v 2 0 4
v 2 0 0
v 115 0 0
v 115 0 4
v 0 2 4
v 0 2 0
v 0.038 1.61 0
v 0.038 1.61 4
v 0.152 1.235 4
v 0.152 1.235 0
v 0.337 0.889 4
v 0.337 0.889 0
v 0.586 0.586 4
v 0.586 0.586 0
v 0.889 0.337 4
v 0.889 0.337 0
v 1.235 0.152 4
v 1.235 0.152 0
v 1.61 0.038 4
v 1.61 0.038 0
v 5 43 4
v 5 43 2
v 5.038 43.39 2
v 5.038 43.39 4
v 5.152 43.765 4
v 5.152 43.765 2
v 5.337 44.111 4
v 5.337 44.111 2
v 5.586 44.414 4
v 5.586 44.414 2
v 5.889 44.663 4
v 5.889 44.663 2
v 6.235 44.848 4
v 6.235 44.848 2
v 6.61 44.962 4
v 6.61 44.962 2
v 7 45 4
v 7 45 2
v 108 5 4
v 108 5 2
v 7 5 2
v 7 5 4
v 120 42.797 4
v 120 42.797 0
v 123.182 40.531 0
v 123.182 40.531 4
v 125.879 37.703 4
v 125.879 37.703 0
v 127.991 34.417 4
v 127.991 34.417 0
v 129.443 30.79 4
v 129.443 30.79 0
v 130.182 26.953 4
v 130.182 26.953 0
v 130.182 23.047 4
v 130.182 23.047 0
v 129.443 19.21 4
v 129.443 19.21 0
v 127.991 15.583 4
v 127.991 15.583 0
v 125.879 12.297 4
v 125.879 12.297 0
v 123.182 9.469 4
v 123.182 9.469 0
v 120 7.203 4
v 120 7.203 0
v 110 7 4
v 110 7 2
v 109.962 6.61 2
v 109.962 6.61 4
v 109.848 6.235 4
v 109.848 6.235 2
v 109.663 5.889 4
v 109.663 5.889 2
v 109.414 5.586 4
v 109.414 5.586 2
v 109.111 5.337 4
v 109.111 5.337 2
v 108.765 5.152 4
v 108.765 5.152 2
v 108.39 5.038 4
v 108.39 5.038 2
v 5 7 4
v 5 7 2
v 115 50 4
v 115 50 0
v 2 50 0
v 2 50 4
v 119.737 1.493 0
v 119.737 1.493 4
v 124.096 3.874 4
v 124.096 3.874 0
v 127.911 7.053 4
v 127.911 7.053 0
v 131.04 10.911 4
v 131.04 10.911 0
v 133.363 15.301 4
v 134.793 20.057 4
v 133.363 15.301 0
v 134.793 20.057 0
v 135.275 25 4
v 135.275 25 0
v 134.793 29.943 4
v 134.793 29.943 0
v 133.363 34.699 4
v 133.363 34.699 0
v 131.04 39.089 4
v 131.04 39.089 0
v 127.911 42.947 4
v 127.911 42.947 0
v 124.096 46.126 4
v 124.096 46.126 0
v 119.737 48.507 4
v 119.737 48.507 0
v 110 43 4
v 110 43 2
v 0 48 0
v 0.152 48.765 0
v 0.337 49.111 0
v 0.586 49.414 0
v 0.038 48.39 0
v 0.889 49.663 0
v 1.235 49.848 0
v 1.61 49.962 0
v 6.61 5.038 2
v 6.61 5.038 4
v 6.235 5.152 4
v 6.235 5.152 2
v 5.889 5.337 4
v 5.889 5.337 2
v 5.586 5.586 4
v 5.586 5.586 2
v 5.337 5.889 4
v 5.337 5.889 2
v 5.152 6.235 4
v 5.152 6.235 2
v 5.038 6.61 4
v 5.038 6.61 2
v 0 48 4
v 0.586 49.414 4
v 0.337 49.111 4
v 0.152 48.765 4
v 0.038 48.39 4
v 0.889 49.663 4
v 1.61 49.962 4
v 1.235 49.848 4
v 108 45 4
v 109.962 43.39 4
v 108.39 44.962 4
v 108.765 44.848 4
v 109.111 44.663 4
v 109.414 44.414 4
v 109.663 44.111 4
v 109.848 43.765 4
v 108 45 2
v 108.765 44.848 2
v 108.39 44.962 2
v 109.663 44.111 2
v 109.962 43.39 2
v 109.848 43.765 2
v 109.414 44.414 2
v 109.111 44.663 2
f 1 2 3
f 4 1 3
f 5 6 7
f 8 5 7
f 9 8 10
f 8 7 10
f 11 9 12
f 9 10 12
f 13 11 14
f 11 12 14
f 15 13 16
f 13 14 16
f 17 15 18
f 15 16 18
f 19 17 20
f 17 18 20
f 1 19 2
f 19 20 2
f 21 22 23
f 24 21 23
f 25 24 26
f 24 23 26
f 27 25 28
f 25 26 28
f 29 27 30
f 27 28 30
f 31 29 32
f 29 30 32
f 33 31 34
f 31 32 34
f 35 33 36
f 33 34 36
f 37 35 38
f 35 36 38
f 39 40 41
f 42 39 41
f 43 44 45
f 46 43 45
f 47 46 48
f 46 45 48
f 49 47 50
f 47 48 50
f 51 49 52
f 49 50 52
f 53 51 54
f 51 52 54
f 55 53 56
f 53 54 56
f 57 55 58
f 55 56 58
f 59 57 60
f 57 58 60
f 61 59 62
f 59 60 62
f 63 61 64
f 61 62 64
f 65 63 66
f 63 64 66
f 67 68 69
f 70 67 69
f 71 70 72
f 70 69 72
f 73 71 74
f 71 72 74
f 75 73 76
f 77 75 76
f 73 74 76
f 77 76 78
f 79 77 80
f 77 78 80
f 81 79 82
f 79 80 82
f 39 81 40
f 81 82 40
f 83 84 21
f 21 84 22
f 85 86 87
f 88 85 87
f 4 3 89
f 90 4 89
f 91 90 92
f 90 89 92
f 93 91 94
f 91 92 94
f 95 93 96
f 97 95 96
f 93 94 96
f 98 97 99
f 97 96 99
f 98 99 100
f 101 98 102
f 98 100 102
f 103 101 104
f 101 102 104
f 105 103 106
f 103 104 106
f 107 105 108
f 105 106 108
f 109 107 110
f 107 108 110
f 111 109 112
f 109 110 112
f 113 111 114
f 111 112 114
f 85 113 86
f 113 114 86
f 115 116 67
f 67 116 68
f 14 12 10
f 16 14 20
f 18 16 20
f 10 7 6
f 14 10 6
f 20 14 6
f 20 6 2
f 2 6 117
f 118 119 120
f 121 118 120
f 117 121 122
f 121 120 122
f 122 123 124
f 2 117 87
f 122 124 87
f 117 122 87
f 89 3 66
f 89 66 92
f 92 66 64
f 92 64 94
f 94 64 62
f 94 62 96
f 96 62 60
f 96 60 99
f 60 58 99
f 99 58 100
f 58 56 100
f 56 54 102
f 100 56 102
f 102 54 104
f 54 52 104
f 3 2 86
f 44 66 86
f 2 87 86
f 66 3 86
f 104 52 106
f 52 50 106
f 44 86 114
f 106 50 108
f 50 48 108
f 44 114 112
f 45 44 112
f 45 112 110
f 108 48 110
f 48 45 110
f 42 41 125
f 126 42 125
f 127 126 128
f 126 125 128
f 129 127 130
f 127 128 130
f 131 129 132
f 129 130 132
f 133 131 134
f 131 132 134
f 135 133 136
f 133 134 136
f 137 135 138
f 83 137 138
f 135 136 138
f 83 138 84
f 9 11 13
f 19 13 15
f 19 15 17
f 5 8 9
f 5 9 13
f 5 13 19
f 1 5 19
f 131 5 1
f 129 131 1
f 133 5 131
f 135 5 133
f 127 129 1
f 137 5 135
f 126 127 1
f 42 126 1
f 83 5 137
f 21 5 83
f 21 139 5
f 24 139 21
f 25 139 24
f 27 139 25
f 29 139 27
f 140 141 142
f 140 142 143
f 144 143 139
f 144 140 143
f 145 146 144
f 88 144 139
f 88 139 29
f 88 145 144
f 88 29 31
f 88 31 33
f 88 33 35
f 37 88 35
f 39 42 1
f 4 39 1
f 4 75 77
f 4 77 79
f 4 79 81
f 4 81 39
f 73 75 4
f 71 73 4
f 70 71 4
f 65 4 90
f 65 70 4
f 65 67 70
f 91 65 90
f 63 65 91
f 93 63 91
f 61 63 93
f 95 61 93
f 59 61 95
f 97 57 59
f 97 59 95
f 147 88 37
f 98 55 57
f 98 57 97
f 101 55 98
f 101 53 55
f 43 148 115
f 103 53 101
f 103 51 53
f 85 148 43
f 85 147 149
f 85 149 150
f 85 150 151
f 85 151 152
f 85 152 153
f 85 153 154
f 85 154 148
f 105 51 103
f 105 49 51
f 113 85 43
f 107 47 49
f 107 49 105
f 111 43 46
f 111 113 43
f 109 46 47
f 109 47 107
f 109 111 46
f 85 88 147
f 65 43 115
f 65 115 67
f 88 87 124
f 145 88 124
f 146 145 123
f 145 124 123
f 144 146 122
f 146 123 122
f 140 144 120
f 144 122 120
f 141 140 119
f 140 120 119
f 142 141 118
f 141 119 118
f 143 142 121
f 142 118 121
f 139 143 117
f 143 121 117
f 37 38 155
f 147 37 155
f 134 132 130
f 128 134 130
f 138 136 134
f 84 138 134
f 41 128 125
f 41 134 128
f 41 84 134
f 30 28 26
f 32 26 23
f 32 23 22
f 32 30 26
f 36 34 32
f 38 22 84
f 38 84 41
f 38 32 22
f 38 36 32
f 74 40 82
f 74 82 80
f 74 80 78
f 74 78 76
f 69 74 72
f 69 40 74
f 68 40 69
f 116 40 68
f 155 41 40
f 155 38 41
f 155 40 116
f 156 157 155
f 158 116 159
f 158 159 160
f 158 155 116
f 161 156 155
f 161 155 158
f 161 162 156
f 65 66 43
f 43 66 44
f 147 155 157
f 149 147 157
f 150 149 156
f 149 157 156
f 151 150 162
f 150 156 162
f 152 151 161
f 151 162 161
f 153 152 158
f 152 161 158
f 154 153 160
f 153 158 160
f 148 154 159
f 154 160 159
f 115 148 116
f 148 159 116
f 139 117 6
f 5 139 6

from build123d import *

# Parameters (mm, degrees)
F1_DEPTH = 2
F2_DEPTH = 4


with BuildPart() as f1:
    # F0 (on Top) → F1 (new body)
    with BuildSketch(Plane.XY):
        with BuildLine():
            Line((5, 43), (5, 7))
            ThreePointArc((5, 7), (5.585786, 5.585786), (7, 5))
            Line((7, 5), (108, 5))
            ThreePointArc((108, 5), (109.414214, 5.585786), (110, 7))
            Line((110, 7), (110, 43))
            ThreePointArc((110, 43), (109.414214, 44.414214), (108, 45))
            Line((108, 45), (7, 45))
            ThreePointArc((7, 45), (5.585786, 44.414214), (5, 43))
        make_face()
    extrude(amount=F1_DEPTH)

    # F0 (on Top) → F2 (join)
    with BuildSketch(Plane.XY):
        with BuildLine():
            ThreePointArc((0, 2), (0.585786, 0.585786), (2, 0))
            Line((2, 0), (115, 0))
            Line((115, 0), (115, 50))
            Line((115, 50), (2, 50))
            ThreePointArc((2, 50), (0.585786, 49.414214), (0, 48))
            Line((0, 48), (0, 2))
        make_face()
        with BuildLine():
            ThreePointArc((7, 5), (5.585786, 5.585786), (5, 7))
            Line((5, 7), (5, 43))
            ThreePointArc((5, 43), (5.585786, 44.414214), (7, 45))
            Line((7, 45), (108, 45))
            ThreePointArc((108, 45), (109.414214, 44.414214), (110, 43))
            Line((110, 43), (110, 7))
            ThreePointArc((110, 7), (109.414214, 5.585786), (108, 5))
            Line((108, 5), (7, 5))
        make_face(mode=Mode.SUBTRACT)
        with BuildLine():
            Line((115, 50), (115, 0))
            ThreePointArc((115, 0), (135.275224, 25), (115, 50))
        make_face()
        with BuildLine():
            ThreePointArc((120.000005, 42.797239), (130.27522, 25), (120.000005, 7.202761))
            Line((120.000005, 7.202761), (120.000005, 42.797239))
        make_face(mode=Mode.SUBTRACT)
    extrude(amount=F2_DEPTH)


solid = f1.part
